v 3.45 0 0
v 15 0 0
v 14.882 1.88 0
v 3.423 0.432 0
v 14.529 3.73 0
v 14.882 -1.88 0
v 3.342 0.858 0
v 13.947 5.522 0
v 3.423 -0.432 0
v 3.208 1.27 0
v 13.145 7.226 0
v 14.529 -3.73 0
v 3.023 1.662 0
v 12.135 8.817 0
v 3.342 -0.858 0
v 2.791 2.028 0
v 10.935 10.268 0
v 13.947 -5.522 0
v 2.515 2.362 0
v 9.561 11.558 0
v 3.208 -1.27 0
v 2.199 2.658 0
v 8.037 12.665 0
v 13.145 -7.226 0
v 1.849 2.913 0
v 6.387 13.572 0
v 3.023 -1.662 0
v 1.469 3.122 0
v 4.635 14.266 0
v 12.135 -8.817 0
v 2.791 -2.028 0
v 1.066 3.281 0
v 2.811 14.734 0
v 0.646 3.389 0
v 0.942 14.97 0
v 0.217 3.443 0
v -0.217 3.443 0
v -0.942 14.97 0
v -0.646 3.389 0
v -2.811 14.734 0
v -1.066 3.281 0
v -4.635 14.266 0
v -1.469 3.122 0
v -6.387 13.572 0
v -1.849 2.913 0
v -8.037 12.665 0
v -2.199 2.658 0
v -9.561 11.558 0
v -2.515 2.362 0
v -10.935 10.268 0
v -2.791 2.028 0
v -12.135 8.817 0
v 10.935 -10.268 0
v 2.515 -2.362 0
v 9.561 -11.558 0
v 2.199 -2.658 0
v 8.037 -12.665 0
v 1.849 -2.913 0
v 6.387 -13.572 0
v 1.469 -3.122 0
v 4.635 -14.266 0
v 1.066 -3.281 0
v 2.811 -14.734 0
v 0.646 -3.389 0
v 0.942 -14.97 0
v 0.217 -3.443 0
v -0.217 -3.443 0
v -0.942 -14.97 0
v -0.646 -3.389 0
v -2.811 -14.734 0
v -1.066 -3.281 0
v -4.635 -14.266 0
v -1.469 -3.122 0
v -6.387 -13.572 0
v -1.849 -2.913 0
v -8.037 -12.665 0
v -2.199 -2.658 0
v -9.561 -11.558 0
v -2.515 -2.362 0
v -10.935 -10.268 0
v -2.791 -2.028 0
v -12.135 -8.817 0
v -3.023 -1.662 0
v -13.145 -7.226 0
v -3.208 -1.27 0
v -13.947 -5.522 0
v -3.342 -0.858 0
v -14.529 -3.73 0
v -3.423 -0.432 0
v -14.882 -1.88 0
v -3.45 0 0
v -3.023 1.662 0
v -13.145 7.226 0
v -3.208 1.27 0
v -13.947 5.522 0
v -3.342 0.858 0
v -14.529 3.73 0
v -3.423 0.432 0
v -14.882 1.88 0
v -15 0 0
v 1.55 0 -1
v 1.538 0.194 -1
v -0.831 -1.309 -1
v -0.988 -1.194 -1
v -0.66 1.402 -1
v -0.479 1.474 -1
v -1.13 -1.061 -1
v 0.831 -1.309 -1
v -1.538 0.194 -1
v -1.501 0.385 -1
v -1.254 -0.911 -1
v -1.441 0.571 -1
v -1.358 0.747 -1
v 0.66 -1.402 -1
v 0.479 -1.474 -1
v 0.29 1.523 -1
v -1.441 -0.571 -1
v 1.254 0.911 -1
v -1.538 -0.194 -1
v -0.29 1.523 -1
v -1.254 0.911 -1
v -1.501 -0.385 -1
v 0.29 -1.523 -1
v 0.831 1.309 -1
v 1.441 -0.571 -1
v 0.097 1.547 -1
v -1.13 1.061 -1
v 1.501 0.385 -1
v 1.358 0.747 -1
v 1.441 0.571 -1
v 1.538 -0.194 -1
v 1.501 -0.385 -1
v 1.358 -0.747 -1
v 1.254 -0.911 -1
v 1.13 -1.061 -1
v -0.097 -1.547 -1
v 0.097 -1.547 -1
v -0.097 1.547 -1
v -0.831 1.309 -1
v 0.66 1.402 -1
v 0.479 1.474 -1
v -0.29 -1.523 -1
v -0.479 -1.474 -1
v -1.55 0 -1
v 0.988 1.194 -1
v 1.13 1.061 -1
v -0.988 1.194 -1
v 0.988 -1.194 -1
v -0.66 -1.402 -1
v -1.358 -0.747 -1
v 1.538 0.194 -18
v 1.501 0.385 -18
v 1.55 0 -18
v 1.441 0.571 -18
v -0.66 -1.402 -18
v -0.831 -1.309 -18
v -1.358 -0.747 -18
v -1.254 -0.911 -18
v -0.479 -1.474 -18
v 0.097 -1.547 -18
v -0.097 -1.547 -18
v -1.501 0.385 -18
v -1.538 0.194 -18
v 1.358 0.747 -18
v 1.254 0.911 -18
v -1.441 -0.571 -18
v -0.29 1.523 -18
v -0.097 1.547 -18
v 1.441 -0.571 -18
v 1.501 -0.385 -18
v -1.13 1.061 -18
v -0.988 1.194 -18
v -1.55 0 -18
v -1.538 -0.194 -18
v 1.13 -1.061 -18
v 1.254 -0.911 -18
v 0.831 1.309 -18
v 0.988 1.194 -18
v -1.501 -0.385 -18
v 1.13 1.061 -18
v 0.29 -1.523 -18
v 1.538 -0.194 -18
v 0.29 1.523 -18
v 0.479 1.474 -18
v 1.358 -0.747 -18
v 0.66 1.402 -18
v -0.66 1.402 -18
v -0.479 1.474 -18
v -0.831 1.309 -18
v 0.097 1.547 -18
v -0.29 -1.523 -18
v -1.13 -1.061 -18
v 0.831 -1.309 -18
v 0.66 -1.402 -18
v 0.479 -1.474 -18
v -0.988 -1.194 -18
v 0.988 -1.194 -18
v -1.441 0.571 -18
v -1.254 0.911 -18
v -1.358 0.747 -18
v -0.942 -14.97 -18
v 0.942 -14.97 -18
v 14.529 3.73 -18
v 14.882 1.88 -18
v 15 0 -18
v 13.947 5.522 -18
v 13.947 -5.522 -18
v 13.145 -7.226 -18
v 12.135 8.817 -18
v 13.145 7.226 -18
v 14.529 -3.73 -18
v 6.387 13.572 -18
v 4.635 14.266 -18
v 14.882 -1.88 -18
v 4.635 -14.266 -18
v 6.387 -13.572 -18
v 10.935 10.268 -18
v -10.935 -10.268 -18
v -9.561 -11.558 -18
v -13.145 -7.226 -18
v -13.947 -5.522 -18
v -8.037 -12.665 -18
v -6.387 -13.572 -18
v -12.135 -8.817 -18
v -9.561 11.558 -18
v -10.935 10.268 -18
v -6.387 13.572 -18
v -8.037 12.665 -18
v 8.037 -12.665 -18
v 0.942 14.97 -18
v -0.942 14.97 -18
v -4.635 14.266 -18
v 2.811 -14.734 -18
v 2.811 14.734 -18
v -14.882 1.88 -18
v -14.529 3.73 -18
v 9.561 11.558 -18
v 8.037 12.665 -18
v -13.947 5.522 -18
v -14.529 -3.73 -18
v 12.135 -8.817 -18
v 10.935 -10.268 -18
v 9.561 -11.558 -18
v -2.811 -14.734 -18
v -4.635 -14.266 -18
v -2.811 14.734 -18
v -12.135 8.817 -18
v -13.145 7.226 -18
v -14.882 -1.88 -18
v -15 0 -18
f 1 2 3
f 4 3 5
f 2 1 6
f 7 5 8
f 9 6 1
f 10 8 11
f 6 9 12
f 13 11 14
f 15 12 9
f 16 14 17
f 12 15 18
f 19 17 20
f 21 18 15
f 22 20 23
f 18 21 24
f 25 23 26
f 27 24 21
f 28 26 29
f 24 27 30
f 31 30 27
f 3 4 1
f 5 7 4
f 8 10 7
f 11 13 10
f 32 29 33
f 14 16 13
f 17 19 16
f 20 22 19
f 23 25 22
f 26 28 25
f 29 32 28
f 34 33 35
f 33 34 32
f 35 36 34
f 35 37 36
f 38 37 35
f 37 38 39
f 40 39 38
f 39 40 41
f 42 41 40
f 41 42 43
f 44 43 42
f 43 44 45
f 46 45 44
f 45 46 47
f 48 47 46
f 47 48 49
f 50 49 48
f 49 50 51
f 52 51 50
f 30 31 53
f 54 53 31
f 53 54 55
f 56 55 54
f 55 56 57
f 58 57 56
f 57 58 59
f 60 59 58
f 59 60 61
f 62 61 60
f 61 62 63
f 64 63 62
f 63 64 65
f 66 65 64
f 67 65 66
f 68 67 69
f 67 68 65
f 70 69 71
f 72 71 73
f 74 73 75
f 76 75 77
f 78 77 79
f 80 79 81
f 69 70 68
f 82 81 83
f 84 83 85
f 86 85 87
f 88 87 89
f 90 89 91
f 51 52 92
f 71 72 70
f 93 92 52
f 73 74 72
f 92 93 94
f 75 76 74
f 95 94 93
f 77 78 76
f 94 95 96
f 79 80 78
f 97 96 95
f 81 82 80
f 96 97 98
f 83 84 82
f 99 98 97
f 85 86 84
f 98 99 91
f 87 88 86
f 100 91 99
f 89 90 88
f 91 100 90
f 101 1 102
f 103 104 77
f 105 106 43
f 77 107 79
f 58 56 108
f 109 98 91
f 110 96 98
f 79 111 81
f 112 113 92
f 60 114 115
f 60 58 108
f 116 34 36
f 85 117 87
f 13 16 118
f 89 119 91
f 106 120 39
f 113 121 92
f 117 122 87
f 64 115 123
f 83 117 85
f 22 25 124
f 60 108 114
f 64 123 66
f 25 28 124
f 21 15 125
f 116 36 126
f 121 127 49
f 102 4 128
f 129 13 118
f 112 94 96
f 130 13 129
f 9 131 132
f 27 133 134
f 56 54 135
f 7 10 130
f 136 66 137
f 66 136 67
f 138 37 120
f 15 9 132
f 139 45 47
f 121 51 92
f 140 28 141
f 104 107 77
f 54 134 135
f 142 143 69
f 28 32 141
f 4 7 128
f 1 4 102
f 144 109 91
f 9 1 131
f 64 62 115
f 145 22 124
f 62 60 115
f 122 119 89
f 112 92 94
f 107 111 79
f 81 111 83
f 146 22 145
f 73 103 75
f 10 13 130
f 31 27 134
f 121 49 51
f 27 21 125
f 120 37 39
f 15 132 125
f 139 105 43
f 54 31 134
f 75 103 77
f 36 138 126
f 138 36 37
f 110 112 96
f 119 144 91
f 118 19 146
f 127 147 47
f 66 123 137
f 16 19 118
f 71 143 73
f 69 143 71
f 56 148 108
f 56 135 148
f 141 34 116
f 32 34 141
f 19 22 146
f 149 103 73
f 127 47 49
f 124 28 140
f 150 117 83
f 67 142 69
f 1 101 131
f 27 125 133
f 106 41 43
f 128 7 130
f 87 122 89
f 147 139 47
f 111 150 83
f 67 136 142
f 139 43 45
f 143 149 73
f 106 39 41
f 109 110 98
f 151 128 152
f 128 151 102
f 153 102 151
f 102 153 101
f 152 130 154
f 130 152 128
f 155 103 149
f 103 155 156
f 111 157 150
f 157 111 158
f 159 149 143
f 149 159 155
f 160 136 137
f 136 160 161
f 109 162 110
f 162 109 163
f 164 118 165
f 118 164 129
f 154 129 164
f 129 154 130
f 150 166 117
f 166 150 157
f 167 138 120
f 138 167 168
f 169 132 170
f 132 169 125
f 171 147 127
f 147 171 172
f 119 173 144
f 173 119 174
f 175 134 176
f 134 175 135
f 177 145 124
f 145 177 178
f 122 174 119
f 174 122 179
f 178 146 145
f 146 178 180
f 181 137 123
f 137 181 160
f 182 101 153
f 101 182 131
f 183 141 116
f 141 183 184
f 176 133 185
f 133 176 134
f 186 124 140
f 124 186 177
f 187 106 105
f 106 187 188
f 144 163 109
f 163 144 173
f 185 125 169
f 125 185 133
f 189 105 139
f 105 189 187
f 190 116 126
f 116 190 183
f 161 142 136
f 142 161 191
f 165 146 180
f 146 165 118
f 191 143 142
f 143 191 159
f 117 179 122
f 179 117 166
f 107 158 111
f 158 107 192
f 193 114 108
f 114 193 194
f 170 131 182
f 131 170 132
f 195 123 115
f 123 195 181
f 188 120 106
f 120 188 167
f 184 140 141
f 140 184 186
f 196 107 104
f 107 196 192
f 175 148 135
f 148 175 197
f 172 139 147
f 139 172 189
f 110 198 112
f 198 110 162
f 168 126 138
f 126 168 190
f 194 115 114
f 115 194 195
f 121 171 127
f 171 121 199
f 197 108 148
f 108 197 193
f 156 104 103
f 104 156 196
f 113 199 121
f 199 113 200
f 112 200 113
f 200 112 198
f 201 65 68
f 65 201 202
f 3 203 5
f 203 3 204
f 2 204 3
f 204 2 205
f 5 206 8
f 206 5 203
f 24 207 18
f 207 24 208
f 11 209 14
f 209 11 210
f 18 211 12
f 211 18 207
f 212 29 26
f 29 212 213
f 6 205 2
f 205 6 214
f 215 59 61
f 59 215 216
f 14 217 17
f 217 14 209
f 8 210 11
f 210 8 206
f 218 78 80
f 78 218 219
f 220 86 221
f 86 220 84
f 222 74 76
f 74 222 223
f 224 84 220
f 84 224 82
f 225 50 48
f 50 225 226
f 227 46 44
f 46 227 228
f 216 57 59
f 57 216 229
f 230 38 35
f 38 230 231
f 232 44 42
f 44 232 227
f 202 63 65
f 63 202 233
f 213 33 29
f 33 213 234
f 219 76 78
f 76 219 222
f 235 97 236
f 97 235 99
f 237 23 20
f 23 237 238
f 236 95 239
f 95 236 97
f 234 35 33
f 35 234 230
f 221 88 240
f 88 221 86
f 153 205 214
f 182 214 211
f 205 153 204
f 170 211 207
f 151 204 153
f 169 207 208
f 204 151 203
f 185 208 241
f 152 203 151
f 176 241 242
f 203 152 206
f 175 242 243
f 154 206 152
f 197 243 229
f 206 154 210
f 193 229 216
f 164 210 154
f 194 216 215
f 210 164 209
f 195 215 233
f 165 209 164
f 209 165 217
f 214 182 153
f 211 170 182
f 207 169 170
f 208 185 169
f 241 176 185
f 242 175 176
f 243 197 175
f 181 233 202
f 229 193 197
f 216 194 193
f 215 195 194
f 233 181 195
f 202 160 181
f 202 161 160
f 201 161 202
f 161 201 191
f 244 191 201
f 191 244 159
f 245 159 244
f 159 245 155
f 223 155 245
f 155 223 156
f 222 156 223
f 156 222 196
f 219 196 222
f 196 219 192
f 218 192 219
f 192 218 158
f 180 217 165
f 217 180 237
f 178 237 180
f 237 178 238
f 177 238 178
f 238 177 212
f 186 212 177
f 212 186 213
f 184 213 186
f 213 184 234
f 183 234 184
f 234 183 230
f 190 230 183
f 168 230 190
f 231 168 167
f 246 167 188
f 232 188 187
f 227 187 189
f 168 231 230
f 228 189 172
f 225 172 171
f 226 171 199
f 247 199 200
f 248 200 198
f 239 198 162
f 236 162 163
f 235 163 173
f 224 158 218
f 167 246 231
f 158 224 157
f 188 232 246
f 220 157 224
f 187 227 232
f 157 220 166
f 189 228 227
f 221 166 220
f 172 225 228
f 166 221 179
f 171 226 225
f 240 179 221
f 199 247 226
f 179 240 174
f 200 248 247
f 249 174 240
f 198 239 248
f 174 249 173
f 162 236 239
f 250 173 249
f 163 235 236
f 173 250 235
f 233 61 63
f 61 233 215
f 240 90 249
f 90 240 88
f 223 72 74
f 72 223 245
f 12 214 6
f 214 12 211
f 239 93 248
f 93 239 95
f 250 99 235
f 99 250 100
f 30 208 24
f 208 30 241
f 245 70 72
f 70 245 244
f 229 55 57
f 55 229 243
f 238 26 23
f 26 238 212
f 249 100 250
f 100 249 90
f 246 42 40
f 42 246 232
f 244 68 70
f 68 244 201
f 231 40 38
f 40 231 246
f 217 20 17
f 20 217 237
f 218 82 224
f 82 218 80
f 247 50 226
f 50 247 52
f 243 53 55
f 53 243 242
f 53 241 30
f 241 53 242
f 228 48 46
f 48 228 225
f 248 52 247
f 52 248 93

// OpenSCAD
$fn = 50;


difference() {
	union() {
		translate(v = [0, 0, -18.0000000000]) {
			cylinder(h = 18, r = 15.0000000000);
		}
	}
	union() {
		translate(v = [0, 0, 0]) {
			rotate(a = [0, 0, 0]) {
				difference() {
					union() {
						translate(v = [0, 0, -21.0000000000]) {
							cylinder(h = 21, r = 1.2500000000);
						}
						translate(v = [0, 0, -1.0000000000]) {
							cylinder(h = 1.0000000000, r1 = 1.5500000000, r2 = 3.4500000000);
						}
						translate(v = [0, 0, -21.0000000000]) {
							cylinder(h = 21, r = 1.5500000000);
						}
						translate(v = [0, 0, -21.0000000000]) {
							cylinder(h = 21, r = 1.2500000000);
						}
					}
					union();
				}
			}
		}
	}
}
